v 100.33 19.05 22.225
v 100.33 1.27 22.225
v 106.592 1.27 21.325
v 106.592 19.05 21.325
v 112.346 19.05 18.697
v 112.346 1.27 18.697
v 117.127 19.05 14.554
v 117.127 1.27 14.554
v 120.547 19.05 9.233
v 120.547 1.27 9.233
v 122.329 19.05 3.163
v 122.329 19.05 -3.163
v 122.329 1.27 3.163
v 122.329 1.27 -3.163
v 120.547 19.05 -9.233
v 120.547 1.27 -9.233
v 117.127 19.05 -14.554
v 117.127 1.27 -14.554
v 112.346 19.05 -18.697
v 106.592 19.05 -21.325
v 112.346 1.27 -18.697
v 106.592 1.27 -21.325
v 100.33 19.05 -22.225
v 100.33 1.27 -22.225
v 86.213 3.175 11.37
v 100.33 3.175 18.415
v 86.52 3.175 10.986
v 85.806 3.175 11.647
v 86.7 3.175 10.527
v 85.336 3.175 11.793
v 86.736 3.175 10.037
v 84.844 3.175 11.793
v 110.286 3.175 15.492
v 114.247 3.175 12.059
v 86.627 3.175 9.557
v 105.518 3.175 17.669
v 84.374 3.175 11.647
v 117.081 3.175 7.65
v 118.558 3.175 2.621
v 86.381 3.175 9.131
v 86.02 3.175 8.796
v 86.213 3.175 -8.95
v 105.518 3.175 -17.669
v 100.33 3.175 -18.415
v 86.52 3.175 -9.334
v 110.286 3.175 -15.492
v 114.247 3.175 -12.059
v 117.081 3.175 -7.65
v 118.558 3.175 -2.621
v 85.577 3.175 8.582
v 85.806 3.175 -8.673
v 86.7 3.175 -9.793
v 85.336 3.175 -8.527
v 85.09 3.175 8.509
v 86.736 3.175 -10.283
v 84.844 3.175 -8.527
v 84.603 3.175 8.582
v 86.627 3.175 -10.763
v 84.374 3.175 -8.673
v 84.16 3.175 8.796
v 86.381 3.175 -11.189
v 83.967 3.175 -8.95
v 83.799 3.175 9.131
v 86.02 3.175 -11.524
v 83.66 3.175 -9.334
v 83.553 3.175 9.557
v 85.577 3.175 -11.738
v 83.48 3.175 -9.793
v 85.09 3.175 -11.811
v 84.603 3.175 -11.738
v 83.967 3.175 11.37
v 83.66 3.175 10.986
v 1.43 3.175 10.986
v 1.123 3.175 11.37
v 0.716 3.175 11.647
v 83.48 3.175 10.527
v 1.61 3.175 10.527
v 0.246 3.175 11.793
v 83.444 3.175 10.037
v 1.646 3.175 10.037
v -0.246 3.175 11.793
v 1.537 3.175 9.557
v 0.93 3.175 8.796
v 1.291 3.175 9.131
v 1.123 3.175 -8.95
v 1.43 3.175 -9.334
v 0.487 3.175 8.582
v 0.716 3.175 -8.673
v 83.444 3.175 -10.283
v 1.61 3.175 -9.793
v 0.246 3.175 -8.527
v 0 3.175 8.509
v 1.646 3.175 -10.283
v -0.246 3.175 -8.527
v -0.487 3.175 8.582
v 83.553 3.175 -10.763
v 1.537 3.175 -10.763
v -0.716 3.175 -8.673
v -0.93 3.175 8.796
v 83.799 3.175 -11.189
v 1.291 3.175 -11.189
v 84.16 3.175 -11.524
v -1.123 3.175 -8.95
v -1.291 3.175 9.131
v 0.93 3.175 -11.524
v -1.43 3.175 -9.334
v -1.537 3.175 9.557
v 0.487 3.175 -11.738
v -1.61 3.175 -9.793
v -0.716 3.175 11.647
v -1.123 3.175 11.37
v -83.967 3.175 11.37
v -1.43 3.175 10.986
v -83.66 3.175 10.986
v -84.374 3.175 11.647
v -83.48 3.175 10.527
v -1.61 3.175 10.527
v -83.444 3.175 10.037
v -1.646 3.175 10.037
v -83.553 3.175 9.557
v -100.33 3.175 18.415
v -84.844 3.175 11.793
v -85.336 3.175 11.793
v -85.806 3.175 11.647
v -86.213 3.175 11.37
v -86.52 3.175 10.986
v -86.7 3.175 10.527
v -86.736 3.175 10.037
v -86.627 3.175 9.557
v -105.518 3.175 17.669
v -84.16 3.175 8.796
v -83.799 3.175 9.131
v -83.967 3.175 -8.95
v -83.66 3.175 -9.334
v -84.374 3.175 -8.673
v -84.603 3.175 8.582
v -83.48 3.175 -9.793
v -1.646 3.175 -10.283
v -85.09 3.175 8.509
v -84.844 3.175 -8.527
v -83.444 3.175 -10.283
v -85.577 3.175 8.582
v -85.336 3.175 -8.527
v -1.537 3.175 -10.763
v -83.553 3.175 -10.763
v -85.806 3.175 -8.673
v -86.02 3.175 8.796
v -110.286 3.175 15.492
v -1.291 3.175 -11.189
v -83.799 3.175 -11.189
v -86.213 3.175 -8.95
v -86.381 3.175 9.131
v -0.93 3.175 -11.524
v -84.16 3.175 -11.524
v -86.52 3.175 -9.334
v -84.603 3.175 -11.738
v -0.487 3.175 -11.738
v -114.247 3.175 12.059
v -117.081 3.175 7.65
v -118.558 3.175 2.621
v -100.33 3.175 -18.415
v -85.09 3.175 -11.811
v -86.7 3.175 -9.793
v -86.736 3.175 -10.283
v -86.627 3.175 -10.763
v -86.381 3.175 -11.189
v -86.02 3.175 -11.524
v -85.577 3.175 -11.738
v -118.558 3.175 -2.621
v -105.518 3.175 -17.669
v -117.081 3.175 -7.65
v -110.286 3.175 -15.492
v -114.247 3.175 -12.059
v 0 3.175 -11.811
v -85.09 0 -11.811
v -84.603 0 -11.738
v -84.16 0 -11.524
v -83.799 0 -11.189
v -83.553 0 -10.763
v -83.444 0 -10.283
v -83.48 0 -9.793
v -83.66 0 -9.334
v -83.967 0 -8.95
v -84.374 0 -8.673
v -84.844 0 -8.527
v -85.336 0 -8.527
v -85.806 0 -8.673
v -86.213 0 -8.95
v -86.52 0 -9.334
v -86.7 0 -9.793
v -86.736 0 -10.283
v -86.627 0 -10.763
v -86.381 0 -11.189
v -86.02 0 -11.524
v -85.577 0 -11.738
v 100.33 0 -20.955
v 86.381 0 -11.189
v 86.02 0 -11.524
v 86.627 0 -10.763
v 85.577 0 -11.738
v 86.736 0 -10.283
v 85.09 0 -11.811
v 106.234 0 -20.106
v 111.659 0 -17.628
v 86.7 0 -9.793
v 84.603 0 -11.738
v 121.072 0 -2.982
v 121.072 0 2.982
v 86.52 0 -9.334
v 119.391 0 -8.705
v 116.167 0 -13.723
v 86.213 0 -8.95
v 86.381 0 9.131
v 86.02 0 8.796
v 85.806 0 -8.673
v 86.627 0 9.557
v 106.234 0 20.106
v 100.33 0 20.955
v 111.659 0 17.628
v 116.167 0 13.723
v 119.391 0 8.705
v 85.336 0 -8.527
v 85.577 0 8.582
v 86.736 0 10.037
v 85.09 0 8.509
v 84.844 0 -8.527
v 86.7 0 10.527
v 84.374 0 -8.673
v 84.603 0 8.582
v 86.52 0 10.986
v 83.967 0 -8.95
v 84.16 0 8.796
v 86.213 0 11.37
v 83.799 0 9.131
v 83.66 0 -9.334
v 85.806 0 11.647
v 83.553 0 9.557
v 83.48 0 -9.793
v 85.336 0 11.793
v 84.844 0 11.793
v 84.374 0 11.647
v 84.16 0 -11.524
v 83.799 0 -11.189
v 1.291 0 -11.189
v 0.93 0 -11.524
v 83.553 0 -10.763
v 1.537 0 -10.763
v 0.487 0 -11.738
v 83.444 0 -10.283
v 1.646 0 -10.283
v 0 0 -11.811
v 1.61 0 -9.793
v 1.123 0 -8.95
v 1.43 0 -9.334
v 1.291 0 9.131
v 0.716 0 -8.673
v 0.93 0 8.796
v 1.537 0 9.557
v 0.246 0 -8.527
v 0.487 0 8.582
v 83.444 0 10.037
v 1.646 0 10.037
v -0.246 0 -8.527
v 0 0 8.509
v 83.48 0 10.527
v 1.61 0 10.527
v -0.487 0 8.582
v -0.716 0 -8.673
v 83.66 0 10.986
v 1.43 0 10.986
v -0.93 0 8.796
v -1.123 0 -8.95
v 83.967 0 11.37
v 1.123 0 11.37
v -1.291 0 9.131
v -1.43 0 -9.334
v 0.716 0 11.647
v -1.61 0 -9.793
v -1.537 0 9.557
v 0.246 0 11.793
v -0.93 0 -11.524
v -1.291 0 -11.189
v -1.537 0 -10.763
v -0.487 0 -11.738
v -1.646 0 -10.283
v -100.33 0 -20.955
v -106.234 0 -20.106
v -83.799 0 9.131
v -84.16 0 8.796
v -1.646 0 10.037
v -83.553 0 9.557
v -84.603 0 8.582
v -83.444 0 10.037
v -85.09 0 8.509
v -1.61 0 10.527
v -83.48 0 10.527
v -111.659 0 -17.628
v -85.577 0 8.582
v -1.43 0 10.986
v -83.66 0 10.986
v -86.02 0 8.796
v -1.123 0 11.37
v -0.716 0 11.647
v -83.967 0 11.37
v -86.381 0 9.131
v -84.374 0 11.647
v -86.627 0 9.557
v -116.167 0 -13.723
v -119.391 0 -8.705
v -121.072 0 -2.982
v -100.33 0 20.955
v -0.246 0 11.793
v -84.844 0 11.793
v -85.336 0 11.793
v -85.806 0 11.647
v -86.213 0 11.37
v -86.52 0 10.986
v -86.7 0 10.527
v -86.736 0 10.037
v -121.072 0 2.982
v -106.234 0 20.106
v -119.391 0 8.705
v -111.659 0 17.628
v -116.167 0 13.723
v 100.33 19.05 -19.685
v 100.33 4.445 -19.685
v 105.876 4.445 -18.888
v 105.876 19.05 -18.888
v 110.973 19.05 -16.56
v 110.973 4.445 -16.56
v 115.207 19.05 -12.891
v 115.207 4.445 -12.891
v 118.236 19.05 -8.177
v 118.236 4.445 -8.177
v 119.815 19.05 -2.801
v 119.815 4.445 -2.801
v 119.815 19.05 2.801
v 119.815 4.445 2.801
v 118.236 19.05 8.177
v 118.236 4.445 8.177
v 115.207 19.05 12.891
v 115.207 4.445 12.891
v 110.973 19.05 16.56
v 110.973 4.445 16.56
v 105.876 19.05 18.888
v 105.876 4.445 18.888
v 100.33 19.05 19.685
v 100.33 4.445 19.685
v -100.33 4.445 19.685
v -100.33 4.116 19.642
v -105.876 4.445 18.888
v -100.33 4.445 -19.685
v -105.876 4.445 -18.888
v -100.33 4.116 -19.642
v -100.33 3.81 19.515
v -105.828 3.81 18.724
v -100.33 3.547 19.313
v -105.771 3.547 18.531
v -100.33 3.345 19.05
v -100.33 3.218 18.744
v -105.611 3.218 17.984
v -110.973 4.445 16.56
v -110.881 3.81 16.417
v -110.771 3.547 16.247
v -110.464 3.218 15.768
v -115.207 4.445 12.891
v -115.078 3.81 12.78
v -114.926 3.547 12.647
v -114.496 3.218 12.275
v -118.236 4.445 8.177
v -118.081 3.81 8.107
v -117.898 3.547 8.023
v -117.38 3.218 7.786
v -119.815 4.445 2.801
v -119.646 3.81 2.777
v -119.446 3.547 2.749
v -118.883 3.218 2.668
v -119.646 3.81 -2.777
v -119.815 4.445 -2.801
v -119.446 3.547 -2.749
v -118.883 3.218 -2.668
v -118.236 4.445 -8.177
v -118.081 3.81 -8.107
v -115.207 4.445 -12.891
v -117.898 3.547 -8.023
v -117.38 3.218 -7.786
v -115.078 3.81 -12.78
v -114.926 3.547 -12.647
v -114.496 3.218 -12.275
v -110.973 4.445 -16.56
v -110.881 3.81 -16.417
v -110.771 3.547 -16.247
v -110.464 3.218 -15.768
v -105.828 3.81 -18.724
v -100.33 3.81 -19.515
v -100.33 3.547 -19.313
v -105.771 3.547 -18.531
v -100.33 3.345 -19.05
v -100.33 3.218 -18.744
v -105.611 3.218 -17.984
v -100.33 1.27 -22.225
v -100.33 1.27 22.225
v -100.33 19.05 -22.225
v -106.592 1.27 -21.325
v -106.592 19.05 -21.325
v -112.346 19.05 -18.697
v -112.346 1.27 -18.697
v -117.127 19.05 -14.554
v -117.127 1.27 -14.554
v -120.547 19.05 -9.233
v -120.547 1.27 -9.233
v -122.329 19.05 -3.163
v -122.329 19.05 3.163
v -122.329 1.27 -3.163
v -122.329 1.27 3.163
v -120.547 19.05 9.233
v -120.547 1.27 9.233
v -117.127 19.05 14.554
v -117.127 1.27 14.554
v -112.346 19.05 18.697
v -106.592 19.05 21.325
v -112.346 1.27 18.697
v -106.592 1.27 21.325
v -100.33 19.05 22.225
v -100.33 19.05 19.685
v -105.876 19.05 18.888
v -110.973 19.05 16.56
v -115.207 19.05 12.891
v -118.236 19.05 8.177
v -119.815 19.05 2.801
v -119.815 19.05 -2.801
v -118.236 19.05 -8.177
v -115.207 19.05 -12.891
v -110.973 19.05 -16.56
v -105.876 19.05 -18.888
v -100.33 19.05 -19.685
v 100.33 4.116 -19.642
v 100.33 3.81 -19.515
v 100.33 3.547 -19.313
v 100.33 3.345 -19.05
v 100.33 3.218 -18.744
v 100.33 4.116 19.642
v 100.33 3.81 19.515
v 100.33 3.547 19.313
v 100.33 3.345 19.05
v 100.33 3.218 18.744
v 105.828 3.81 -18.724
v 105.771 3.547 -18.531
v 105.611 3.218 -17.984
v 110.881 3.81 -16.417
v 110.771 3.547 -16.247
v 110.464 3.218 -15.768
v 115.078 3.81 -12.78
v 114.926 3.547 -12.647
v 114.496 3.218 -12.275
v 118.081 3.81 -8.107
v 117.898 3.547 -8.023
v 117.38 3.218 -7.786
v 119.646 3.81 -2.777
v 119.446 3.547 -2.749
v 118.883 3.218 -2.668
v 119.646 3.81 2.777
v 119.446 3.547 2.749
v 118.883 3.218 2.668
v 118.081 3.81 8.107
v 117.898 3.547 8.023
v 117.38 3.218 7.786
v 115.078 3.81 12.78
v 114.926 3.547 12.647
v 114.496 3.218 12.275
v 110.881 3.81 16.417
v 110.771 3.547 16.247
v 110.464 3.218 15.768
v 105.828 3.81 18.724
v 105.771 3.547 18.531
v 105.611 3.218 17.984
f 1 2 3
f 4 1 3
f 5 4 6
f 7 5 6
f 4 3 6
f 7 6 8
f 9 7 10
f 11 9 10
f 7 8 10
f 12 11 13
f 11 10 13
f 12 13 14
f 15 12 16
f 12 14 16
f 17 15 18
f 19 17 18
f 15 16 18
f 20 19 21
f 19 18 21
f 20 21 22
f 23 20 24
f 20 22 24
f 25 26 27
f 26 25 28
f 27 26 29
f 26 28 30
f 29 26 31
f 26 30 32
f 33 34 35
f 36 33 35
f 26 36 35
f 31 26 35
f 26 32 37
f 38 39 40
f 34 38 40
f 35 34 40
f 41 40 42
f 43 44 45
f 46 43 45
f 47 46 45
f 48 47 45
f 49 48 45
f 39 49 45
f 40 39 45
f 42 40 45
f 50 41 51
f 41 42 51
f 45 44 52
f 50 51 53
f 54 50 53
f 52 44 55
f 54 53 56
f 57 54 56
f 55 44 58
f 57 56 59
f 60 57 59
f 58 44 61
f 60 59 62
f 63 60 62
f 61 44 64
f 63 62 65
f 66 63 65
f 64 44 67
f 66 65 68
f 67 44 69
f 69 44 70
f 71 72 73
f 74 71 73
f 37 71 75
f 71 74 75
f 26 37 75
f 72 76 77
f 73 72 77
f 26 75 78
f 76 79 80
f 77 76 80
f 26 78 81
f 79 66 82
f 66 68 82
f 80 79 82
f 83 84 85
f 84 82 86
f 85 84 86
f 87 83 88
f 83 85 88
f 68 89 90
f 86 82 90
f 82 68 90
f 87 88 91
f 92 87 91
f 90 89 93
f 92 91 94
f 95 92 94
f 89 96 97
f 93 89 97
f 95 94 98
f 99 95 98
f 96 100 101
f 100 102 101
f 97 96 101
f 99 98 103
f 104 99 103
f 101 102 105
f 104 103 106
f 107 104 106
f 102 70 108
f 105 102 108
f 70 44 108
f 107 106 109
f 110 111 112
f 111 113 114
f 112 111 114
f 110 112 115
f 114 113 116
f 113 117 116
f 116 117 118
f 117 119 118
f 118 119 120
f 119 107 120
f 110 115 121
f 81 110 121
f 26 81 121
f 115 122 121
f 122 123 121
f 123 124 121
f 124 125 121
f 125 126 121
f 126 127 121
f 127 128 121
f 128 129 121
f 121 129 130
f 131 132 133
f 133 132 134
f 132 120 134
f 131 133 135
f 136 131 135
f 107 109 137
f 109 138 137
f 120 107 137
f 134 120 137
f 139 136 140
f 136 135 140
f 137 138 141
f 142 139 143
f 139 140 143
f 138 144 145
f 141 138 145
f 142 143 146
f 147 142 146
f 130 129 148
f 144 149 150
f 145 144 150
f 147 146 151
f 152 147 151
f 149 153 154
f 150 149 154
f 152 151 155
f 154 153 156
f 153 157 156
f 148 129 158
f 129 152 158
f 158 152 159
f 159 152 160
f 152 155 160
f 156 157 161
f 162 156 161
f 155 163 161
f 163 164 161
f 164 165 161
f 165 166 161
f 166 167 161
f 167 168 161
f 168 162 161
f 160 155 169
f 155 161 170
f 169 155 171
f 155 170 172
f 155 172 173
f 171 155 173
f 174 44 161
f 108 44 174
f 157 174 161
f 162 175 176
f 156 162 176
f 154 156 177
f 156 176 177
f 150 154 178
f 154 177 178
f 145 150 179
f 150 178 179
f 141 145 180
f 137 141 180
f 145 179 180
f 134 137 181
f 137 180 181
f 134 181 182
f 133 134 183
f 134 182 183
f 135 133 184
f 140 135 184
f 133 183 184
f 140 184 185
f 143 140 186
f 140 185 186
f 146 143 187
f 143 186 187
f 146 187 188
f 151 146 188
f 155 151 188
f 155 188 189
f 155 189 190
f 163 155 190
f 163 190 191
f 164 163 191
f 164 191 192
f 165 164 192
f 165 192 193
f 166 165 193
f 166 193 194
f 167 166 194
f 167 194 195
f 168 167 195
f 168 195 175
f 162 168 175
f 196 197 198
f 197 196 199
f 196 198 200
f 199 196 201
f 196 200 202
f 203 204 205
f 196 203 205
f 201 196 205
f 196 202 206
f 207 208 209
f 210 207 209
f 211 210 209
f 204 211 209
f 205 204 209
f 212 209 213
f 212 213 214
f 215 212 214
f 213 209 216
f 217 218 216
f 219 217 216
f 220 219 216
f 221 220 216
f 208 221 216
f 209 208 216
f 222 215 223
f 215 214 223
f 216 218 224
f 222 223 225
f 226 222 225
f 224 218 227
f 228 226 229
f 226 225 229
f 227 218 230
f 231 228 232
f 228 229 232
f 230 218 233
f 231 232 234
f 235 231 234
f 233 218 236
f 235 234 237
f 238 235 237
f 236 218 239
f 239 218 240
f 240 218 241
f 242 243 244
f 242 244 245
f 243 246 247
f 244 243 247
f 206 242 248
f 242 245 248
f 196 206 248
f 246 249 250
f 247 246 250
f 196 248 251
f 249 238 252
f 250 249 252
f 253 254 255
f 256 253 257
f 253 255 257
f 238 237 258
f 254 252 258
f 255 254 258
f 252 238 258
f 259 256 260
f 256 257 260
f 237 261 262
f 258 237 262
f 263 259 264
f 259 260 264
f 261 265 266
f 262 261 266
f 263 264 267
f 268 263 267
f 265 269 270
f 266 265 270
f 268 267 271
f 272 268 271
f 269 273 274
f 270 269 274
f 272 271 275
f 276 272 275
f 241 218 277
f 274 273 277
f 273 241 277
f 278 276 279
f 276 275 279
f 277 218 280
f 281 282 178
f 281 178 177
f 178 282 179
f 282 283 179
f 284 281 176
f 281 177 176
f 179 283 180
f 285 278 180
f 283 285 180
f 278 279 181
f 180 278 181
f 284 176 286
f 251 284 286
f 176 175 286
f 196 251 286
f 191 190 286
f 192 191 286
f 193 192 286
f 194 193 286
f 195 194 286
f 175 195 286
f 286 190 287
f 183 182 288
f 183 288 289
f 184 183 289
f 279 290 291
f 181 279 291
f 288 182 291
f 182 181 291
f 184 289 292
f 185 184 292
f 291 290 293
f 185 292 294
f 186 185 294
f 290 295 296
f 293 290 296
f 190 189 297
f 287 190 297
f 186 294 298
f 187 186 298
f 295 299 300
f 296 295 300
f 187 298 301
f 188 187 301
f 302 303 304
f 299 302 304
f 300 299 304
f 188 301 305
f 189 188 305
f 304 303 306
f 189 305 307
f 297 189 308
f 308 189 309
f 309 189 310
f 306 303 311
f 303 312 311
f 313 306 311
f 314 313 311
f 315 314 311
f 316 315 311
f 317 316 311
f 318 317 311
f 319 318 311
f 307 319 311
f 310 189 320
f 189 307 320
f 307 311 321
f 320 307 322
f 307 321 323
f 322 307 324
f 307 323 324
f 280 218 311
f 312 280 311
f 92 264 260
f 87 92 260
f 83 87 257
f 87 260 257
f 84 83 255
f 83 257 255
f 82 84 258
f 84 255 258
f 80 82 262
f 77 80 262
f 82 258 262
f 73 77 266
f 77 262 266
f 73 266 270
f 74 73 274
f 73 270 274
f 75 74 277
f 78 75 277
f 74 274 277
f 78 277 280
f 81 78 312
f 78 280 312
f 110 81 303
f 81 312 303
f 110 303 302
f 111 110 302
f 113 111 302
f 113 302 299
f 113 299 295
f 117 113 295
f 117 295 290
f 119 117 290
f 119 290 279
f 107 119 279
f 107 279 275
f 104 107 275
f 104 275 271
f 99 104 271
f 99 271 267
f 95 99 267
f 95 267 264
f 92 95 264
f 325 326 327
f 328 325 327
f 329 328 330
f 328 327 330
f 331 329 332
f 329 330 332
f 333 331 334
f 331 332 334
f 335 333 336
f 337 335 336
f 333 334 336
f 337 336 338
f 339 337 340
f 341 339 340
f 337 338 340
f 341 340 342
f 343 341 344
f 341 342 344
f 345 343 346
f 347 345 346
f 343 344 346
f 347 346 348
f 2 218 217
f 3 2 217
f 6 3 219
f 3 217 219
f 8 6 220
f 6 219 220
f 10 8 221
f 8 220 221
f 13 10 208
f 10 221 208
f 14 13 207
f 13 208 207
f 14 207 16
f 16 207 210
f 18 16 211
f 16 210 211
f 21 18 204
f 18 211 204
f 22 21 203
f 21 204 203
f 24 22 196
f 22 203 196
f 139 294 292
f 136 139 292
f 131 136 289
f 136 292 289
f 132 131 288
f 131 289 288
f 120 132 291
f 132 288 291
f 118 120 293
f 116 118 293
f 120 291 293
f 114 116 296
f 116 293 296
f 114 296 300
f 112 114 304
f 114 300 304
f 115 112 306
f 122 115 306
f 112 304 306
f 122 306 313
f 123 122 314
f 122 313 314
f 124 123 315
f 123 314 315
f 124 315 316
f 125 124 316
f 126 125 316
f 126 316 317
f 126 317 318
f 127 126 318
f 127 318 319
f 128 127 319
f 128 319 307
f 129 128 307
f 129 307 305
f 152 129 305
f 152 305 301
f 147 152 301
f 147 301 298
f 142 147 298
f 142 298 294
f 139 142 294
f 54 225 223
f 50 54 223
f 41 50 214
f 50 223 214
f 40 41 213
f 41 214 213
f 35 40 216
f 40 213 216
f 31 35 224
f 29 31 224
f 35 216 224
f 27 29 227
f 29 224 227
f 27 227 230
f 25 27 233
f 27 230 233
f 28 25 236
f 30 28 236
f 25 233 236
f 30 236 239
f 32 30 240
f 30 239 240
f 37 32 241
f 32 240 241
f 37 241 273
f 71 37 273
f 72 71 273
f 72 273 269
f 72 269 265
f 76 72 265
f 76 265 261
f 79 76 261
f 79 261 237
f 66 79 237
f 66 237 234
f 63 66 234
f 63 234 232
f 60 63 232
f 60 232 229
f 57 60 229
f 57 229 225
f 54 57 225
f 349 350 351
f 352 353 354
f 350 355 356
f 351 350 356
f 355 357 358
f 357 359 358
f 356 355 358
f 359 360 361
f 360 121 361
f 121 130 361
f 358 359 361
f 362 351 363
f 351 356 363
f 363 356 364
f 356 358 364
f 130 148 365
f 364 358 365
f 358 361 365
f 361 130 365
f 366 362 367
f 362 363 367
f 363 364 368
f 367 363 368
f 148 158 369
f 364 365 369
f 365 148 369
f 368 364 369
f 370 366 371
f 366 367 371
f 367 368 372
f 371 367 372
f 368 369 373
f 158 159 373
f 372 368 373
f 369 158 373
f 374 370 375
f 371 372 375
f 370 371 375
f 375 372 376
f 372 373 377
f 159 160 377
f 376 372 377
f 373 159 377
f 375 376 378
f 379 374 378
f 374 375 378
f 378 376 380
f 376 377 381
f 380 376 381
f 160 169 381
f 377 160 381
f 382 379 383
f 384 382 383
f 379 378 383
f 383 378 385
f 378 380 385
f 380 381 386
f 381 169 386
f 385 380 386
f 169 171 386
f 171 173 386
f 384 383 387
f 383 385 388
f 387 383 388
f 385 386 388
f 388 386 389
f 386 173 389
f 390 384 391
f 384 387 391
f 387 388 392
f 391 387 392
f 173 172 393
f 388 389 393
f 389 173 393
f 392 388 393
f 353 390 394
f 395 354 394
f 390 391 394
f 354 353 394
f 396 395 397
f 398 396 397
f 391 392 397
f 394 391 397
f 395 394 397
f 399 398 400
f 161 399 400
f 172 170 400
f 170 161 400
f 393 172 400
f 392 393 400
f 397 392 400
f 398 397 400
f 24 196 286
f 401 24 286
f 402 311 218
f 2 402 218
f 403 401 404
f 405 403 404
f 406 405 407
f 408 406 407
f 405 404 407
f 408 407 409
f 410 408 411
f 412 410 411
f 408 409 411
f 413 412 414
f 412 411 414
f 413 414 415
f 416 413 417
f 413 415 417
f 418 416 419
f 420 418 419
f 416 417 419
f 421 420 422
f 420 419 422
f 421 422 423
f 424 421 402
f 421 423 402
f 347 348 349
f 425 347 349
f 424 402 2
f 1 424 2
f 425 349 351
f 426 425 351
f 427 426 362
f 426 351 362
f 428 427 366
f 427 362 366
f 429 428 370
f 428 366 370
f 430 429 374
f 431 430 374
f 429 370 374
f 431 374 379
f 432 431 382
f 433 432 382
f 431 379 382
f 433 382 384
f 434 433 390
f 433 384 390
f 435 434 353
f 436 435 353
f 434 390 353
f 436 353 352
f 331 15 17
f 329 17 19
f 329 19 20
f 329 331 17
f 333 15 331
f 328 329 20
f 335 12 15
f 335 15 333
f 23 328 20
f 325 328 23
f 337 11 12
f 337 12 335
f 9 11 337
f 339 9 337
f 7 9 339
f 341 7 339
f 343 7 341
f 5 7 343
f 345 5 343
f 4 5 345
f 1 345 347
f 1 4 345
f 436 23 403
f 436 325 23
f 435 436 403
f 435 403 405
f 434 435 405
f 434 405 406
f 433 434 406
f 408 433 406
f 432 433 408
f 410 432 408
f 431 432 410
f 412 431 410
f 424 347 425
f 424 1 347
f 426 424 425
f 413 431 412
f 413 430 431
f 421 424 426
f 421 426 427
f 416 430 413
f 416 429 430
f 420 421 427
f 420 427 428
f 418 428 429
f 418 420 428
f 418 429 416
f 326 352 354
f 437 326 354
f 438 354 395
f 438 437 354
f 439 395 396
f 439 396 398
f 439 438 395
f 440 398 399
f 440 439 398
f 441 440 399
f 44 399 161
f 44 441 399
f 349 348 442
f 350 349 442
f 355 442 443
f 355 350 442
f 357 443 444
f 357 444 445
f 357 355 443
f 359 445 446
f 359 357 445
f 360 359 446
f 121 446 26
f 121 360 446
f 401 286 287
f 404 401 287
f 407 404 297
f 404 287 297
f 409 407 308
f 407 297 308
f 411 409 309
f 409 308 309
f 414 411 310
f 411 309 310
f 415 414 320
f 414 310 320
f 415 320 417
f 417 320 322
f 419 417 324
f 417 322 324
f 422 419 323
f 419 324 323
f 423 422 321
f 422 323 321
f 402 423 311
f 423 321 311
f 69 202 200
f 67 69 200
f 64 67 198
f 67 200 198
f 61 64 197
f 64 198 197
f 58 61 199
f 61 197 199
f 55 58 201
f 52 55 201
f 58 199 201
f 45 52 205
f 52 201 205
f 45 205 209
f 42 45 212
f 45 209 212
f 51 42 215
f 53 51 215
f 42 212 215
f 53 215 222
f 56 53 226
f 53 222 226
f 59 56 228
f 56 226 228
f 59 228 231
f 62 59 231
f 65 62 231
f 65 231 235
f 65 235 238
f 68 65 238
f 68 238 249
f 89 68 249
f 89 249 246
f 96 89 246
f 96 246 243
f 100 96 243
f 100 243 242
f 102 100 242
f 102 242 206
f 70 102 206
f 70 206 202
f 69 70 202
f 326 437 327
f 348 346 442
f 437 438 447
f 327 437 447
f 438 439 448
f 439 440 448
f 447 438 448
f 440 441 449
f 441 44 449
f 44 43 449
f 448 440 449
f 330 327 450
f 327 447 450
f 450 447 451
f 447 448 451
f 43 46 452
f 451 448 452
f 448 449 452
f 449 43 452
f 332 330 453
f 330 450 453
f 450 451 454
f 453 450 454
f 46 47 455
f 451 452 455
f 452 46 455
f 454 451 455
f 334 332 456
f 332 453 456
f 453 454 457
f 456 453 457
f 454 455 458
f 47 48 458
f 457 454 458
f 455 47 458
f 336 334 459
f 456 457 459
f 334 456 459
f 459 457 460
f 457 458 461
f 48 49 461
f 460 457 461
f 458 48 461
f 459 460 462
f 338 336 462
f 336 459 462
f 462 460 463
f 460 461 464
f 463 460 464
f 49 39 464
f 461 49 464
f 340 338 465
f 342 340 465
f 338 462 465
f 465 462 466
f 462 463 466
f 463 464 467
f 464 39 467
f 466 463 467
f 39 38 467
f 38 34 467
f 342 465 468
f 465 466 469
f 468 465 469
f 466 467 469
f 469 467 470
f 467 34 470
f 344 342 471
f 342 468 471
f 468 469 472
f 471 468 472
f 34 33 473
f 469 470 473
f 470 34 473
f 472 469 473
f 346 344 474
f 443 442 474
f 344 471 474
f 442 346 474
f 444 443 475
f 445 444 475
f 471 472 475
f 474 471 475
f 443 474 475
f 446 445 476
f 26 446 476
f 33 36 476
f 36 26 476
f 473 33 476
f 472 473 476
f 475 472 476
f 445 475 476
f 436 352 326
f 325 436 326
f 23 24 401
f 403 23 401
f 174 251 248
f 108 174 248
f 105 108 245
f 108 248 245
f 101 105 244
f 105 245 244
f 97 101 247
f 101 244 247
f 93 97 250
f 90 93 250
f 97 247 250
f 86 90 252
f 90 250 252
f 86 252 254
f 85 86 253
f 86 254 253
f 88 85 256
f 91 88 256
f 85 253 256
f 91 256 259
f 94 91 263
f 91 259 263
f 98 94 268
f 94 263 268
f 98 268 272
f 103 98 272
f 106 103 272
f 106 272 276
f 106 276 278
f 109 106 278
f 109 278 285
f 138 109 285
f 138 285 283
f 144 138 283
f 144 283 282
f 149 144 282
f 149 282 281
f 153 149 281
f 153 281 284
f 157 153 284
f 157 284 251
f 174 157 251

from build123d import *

# Parameters (mm, degrees)
MAINBLOCK_DEPTH     = 3.175
BOSS_EXTRUDE1_DEPTH = 19.05
SKETCH3_R           = 1.651
MOUNT_HOLES_DEPTH   = 127.00230613
FILLET1_R           = 1.27
CHAMFER1_SIZE       = 1.27


with BuildPart() as part:
    # Sketch1 → MainBlock (new body)
    with BuildSketch(Plane(origin=(0, 0, 0), x_dir=(1, 0, 0), z_dir=(0, 1, 0))):
        with BuildLine():
            Line((-100.33, 19.685), (100.33, 19.685))
            ThreePointArc((100.33, 19.685), (120.015, 0), (100.33, -19.685))
            Line((100.33, -19.685), (-100.33, -19.685))
            ThreePointArc((-100.33, -19.685), (-120.015, 0), (-100.33, 19.685))
        make_face()
    extrude(amount=MAINBLOCK_DEPTH)

    # Sketch2 → Boss-Extrude1 (add)
    with BuildSketch(Plane.XZ):
        with BuildLine():
            Line((-100.33, 22.225), (100.33, 22.225))
            ThreePointArc((100.33, 22.225), (122.555, 0), (100.33, -22.225))
            Line((100.33, -22.225), (-100.33, -22.225))
            ThreePointArc((-100.33, -22.225), (-122.555, 0), (-100.33, 22.225))
        make_face()
        with BuildLine():
            Line((100.33, 19.685), (-100.33, 19.685))
            ThreePointArc((-100.33, 19.685), (-120.015, 0), (-100.33, -19.685))
            Line((-100.33, -19.685), (100.33, -19.685))
            ThreePointArc((100.33, -19.685), (120.015, 0), (100.33, 19.685))
        make_face(mode=Mode.SUBTRACT)
    extrude(amount=-BOSS_EXTRUDE1_DEPTH)

    # Sketch3 → Mount-Holes (cut, through all)
    with BuildSketch(Plane.XZ):
        with Locations(Location((0, 10.16, 0), (0, 0, 270))):
            Circle(SKETCH3_R)
        with Locations(Location((-85.09, 10.16, 0), (0, 0, 270))):
            Circle(SKETCH3_R)
        with Locations(Location((85.09, 10.16, 0), (0, 0, 270))):
            Circle(SKETCH3_R)
        with Locations(Location((85.09, -10.16, 0), (0, 0, 270))):
            Circle(SKETCH3_R)
        with Locations(Location((-85.09, -10.16, 0), (0, 0, 270))):
            Circle(SKETCH3_R)
        with Locations(Location((0, -10.16, 0), (0, 0, 270))):
            Circle(SKETCH3_R)
    extrude(amount=-MOUNT_HOLES_DEPTH, mode=Mode.SUBTRACT)

    # Fillet1
    fillet1_edges = [part.edges().sort_by_distance(p)[0] for p in [
        (120.015, 3.175, 0),
        (0, 3.175, -19.685),
        (-120.015, 3.175, 0),
        (0, 3.175, 19.685),
    ]]
    fillet(fillet1_edges, radius=FILLET1_R)

    # Chamfer1
    chamfer1_edges = [part.edges().sort_by_distance(p)[0] for p in [
        (-122.555, 0, 0),
        (0, 0, -22.225),
        (122.555, 0, 0),
        (0, 0, 22.225),
    ]]
    chamfer(chamfer1_edges, length=CHAMFER1_SIZE)


solid = part.part
